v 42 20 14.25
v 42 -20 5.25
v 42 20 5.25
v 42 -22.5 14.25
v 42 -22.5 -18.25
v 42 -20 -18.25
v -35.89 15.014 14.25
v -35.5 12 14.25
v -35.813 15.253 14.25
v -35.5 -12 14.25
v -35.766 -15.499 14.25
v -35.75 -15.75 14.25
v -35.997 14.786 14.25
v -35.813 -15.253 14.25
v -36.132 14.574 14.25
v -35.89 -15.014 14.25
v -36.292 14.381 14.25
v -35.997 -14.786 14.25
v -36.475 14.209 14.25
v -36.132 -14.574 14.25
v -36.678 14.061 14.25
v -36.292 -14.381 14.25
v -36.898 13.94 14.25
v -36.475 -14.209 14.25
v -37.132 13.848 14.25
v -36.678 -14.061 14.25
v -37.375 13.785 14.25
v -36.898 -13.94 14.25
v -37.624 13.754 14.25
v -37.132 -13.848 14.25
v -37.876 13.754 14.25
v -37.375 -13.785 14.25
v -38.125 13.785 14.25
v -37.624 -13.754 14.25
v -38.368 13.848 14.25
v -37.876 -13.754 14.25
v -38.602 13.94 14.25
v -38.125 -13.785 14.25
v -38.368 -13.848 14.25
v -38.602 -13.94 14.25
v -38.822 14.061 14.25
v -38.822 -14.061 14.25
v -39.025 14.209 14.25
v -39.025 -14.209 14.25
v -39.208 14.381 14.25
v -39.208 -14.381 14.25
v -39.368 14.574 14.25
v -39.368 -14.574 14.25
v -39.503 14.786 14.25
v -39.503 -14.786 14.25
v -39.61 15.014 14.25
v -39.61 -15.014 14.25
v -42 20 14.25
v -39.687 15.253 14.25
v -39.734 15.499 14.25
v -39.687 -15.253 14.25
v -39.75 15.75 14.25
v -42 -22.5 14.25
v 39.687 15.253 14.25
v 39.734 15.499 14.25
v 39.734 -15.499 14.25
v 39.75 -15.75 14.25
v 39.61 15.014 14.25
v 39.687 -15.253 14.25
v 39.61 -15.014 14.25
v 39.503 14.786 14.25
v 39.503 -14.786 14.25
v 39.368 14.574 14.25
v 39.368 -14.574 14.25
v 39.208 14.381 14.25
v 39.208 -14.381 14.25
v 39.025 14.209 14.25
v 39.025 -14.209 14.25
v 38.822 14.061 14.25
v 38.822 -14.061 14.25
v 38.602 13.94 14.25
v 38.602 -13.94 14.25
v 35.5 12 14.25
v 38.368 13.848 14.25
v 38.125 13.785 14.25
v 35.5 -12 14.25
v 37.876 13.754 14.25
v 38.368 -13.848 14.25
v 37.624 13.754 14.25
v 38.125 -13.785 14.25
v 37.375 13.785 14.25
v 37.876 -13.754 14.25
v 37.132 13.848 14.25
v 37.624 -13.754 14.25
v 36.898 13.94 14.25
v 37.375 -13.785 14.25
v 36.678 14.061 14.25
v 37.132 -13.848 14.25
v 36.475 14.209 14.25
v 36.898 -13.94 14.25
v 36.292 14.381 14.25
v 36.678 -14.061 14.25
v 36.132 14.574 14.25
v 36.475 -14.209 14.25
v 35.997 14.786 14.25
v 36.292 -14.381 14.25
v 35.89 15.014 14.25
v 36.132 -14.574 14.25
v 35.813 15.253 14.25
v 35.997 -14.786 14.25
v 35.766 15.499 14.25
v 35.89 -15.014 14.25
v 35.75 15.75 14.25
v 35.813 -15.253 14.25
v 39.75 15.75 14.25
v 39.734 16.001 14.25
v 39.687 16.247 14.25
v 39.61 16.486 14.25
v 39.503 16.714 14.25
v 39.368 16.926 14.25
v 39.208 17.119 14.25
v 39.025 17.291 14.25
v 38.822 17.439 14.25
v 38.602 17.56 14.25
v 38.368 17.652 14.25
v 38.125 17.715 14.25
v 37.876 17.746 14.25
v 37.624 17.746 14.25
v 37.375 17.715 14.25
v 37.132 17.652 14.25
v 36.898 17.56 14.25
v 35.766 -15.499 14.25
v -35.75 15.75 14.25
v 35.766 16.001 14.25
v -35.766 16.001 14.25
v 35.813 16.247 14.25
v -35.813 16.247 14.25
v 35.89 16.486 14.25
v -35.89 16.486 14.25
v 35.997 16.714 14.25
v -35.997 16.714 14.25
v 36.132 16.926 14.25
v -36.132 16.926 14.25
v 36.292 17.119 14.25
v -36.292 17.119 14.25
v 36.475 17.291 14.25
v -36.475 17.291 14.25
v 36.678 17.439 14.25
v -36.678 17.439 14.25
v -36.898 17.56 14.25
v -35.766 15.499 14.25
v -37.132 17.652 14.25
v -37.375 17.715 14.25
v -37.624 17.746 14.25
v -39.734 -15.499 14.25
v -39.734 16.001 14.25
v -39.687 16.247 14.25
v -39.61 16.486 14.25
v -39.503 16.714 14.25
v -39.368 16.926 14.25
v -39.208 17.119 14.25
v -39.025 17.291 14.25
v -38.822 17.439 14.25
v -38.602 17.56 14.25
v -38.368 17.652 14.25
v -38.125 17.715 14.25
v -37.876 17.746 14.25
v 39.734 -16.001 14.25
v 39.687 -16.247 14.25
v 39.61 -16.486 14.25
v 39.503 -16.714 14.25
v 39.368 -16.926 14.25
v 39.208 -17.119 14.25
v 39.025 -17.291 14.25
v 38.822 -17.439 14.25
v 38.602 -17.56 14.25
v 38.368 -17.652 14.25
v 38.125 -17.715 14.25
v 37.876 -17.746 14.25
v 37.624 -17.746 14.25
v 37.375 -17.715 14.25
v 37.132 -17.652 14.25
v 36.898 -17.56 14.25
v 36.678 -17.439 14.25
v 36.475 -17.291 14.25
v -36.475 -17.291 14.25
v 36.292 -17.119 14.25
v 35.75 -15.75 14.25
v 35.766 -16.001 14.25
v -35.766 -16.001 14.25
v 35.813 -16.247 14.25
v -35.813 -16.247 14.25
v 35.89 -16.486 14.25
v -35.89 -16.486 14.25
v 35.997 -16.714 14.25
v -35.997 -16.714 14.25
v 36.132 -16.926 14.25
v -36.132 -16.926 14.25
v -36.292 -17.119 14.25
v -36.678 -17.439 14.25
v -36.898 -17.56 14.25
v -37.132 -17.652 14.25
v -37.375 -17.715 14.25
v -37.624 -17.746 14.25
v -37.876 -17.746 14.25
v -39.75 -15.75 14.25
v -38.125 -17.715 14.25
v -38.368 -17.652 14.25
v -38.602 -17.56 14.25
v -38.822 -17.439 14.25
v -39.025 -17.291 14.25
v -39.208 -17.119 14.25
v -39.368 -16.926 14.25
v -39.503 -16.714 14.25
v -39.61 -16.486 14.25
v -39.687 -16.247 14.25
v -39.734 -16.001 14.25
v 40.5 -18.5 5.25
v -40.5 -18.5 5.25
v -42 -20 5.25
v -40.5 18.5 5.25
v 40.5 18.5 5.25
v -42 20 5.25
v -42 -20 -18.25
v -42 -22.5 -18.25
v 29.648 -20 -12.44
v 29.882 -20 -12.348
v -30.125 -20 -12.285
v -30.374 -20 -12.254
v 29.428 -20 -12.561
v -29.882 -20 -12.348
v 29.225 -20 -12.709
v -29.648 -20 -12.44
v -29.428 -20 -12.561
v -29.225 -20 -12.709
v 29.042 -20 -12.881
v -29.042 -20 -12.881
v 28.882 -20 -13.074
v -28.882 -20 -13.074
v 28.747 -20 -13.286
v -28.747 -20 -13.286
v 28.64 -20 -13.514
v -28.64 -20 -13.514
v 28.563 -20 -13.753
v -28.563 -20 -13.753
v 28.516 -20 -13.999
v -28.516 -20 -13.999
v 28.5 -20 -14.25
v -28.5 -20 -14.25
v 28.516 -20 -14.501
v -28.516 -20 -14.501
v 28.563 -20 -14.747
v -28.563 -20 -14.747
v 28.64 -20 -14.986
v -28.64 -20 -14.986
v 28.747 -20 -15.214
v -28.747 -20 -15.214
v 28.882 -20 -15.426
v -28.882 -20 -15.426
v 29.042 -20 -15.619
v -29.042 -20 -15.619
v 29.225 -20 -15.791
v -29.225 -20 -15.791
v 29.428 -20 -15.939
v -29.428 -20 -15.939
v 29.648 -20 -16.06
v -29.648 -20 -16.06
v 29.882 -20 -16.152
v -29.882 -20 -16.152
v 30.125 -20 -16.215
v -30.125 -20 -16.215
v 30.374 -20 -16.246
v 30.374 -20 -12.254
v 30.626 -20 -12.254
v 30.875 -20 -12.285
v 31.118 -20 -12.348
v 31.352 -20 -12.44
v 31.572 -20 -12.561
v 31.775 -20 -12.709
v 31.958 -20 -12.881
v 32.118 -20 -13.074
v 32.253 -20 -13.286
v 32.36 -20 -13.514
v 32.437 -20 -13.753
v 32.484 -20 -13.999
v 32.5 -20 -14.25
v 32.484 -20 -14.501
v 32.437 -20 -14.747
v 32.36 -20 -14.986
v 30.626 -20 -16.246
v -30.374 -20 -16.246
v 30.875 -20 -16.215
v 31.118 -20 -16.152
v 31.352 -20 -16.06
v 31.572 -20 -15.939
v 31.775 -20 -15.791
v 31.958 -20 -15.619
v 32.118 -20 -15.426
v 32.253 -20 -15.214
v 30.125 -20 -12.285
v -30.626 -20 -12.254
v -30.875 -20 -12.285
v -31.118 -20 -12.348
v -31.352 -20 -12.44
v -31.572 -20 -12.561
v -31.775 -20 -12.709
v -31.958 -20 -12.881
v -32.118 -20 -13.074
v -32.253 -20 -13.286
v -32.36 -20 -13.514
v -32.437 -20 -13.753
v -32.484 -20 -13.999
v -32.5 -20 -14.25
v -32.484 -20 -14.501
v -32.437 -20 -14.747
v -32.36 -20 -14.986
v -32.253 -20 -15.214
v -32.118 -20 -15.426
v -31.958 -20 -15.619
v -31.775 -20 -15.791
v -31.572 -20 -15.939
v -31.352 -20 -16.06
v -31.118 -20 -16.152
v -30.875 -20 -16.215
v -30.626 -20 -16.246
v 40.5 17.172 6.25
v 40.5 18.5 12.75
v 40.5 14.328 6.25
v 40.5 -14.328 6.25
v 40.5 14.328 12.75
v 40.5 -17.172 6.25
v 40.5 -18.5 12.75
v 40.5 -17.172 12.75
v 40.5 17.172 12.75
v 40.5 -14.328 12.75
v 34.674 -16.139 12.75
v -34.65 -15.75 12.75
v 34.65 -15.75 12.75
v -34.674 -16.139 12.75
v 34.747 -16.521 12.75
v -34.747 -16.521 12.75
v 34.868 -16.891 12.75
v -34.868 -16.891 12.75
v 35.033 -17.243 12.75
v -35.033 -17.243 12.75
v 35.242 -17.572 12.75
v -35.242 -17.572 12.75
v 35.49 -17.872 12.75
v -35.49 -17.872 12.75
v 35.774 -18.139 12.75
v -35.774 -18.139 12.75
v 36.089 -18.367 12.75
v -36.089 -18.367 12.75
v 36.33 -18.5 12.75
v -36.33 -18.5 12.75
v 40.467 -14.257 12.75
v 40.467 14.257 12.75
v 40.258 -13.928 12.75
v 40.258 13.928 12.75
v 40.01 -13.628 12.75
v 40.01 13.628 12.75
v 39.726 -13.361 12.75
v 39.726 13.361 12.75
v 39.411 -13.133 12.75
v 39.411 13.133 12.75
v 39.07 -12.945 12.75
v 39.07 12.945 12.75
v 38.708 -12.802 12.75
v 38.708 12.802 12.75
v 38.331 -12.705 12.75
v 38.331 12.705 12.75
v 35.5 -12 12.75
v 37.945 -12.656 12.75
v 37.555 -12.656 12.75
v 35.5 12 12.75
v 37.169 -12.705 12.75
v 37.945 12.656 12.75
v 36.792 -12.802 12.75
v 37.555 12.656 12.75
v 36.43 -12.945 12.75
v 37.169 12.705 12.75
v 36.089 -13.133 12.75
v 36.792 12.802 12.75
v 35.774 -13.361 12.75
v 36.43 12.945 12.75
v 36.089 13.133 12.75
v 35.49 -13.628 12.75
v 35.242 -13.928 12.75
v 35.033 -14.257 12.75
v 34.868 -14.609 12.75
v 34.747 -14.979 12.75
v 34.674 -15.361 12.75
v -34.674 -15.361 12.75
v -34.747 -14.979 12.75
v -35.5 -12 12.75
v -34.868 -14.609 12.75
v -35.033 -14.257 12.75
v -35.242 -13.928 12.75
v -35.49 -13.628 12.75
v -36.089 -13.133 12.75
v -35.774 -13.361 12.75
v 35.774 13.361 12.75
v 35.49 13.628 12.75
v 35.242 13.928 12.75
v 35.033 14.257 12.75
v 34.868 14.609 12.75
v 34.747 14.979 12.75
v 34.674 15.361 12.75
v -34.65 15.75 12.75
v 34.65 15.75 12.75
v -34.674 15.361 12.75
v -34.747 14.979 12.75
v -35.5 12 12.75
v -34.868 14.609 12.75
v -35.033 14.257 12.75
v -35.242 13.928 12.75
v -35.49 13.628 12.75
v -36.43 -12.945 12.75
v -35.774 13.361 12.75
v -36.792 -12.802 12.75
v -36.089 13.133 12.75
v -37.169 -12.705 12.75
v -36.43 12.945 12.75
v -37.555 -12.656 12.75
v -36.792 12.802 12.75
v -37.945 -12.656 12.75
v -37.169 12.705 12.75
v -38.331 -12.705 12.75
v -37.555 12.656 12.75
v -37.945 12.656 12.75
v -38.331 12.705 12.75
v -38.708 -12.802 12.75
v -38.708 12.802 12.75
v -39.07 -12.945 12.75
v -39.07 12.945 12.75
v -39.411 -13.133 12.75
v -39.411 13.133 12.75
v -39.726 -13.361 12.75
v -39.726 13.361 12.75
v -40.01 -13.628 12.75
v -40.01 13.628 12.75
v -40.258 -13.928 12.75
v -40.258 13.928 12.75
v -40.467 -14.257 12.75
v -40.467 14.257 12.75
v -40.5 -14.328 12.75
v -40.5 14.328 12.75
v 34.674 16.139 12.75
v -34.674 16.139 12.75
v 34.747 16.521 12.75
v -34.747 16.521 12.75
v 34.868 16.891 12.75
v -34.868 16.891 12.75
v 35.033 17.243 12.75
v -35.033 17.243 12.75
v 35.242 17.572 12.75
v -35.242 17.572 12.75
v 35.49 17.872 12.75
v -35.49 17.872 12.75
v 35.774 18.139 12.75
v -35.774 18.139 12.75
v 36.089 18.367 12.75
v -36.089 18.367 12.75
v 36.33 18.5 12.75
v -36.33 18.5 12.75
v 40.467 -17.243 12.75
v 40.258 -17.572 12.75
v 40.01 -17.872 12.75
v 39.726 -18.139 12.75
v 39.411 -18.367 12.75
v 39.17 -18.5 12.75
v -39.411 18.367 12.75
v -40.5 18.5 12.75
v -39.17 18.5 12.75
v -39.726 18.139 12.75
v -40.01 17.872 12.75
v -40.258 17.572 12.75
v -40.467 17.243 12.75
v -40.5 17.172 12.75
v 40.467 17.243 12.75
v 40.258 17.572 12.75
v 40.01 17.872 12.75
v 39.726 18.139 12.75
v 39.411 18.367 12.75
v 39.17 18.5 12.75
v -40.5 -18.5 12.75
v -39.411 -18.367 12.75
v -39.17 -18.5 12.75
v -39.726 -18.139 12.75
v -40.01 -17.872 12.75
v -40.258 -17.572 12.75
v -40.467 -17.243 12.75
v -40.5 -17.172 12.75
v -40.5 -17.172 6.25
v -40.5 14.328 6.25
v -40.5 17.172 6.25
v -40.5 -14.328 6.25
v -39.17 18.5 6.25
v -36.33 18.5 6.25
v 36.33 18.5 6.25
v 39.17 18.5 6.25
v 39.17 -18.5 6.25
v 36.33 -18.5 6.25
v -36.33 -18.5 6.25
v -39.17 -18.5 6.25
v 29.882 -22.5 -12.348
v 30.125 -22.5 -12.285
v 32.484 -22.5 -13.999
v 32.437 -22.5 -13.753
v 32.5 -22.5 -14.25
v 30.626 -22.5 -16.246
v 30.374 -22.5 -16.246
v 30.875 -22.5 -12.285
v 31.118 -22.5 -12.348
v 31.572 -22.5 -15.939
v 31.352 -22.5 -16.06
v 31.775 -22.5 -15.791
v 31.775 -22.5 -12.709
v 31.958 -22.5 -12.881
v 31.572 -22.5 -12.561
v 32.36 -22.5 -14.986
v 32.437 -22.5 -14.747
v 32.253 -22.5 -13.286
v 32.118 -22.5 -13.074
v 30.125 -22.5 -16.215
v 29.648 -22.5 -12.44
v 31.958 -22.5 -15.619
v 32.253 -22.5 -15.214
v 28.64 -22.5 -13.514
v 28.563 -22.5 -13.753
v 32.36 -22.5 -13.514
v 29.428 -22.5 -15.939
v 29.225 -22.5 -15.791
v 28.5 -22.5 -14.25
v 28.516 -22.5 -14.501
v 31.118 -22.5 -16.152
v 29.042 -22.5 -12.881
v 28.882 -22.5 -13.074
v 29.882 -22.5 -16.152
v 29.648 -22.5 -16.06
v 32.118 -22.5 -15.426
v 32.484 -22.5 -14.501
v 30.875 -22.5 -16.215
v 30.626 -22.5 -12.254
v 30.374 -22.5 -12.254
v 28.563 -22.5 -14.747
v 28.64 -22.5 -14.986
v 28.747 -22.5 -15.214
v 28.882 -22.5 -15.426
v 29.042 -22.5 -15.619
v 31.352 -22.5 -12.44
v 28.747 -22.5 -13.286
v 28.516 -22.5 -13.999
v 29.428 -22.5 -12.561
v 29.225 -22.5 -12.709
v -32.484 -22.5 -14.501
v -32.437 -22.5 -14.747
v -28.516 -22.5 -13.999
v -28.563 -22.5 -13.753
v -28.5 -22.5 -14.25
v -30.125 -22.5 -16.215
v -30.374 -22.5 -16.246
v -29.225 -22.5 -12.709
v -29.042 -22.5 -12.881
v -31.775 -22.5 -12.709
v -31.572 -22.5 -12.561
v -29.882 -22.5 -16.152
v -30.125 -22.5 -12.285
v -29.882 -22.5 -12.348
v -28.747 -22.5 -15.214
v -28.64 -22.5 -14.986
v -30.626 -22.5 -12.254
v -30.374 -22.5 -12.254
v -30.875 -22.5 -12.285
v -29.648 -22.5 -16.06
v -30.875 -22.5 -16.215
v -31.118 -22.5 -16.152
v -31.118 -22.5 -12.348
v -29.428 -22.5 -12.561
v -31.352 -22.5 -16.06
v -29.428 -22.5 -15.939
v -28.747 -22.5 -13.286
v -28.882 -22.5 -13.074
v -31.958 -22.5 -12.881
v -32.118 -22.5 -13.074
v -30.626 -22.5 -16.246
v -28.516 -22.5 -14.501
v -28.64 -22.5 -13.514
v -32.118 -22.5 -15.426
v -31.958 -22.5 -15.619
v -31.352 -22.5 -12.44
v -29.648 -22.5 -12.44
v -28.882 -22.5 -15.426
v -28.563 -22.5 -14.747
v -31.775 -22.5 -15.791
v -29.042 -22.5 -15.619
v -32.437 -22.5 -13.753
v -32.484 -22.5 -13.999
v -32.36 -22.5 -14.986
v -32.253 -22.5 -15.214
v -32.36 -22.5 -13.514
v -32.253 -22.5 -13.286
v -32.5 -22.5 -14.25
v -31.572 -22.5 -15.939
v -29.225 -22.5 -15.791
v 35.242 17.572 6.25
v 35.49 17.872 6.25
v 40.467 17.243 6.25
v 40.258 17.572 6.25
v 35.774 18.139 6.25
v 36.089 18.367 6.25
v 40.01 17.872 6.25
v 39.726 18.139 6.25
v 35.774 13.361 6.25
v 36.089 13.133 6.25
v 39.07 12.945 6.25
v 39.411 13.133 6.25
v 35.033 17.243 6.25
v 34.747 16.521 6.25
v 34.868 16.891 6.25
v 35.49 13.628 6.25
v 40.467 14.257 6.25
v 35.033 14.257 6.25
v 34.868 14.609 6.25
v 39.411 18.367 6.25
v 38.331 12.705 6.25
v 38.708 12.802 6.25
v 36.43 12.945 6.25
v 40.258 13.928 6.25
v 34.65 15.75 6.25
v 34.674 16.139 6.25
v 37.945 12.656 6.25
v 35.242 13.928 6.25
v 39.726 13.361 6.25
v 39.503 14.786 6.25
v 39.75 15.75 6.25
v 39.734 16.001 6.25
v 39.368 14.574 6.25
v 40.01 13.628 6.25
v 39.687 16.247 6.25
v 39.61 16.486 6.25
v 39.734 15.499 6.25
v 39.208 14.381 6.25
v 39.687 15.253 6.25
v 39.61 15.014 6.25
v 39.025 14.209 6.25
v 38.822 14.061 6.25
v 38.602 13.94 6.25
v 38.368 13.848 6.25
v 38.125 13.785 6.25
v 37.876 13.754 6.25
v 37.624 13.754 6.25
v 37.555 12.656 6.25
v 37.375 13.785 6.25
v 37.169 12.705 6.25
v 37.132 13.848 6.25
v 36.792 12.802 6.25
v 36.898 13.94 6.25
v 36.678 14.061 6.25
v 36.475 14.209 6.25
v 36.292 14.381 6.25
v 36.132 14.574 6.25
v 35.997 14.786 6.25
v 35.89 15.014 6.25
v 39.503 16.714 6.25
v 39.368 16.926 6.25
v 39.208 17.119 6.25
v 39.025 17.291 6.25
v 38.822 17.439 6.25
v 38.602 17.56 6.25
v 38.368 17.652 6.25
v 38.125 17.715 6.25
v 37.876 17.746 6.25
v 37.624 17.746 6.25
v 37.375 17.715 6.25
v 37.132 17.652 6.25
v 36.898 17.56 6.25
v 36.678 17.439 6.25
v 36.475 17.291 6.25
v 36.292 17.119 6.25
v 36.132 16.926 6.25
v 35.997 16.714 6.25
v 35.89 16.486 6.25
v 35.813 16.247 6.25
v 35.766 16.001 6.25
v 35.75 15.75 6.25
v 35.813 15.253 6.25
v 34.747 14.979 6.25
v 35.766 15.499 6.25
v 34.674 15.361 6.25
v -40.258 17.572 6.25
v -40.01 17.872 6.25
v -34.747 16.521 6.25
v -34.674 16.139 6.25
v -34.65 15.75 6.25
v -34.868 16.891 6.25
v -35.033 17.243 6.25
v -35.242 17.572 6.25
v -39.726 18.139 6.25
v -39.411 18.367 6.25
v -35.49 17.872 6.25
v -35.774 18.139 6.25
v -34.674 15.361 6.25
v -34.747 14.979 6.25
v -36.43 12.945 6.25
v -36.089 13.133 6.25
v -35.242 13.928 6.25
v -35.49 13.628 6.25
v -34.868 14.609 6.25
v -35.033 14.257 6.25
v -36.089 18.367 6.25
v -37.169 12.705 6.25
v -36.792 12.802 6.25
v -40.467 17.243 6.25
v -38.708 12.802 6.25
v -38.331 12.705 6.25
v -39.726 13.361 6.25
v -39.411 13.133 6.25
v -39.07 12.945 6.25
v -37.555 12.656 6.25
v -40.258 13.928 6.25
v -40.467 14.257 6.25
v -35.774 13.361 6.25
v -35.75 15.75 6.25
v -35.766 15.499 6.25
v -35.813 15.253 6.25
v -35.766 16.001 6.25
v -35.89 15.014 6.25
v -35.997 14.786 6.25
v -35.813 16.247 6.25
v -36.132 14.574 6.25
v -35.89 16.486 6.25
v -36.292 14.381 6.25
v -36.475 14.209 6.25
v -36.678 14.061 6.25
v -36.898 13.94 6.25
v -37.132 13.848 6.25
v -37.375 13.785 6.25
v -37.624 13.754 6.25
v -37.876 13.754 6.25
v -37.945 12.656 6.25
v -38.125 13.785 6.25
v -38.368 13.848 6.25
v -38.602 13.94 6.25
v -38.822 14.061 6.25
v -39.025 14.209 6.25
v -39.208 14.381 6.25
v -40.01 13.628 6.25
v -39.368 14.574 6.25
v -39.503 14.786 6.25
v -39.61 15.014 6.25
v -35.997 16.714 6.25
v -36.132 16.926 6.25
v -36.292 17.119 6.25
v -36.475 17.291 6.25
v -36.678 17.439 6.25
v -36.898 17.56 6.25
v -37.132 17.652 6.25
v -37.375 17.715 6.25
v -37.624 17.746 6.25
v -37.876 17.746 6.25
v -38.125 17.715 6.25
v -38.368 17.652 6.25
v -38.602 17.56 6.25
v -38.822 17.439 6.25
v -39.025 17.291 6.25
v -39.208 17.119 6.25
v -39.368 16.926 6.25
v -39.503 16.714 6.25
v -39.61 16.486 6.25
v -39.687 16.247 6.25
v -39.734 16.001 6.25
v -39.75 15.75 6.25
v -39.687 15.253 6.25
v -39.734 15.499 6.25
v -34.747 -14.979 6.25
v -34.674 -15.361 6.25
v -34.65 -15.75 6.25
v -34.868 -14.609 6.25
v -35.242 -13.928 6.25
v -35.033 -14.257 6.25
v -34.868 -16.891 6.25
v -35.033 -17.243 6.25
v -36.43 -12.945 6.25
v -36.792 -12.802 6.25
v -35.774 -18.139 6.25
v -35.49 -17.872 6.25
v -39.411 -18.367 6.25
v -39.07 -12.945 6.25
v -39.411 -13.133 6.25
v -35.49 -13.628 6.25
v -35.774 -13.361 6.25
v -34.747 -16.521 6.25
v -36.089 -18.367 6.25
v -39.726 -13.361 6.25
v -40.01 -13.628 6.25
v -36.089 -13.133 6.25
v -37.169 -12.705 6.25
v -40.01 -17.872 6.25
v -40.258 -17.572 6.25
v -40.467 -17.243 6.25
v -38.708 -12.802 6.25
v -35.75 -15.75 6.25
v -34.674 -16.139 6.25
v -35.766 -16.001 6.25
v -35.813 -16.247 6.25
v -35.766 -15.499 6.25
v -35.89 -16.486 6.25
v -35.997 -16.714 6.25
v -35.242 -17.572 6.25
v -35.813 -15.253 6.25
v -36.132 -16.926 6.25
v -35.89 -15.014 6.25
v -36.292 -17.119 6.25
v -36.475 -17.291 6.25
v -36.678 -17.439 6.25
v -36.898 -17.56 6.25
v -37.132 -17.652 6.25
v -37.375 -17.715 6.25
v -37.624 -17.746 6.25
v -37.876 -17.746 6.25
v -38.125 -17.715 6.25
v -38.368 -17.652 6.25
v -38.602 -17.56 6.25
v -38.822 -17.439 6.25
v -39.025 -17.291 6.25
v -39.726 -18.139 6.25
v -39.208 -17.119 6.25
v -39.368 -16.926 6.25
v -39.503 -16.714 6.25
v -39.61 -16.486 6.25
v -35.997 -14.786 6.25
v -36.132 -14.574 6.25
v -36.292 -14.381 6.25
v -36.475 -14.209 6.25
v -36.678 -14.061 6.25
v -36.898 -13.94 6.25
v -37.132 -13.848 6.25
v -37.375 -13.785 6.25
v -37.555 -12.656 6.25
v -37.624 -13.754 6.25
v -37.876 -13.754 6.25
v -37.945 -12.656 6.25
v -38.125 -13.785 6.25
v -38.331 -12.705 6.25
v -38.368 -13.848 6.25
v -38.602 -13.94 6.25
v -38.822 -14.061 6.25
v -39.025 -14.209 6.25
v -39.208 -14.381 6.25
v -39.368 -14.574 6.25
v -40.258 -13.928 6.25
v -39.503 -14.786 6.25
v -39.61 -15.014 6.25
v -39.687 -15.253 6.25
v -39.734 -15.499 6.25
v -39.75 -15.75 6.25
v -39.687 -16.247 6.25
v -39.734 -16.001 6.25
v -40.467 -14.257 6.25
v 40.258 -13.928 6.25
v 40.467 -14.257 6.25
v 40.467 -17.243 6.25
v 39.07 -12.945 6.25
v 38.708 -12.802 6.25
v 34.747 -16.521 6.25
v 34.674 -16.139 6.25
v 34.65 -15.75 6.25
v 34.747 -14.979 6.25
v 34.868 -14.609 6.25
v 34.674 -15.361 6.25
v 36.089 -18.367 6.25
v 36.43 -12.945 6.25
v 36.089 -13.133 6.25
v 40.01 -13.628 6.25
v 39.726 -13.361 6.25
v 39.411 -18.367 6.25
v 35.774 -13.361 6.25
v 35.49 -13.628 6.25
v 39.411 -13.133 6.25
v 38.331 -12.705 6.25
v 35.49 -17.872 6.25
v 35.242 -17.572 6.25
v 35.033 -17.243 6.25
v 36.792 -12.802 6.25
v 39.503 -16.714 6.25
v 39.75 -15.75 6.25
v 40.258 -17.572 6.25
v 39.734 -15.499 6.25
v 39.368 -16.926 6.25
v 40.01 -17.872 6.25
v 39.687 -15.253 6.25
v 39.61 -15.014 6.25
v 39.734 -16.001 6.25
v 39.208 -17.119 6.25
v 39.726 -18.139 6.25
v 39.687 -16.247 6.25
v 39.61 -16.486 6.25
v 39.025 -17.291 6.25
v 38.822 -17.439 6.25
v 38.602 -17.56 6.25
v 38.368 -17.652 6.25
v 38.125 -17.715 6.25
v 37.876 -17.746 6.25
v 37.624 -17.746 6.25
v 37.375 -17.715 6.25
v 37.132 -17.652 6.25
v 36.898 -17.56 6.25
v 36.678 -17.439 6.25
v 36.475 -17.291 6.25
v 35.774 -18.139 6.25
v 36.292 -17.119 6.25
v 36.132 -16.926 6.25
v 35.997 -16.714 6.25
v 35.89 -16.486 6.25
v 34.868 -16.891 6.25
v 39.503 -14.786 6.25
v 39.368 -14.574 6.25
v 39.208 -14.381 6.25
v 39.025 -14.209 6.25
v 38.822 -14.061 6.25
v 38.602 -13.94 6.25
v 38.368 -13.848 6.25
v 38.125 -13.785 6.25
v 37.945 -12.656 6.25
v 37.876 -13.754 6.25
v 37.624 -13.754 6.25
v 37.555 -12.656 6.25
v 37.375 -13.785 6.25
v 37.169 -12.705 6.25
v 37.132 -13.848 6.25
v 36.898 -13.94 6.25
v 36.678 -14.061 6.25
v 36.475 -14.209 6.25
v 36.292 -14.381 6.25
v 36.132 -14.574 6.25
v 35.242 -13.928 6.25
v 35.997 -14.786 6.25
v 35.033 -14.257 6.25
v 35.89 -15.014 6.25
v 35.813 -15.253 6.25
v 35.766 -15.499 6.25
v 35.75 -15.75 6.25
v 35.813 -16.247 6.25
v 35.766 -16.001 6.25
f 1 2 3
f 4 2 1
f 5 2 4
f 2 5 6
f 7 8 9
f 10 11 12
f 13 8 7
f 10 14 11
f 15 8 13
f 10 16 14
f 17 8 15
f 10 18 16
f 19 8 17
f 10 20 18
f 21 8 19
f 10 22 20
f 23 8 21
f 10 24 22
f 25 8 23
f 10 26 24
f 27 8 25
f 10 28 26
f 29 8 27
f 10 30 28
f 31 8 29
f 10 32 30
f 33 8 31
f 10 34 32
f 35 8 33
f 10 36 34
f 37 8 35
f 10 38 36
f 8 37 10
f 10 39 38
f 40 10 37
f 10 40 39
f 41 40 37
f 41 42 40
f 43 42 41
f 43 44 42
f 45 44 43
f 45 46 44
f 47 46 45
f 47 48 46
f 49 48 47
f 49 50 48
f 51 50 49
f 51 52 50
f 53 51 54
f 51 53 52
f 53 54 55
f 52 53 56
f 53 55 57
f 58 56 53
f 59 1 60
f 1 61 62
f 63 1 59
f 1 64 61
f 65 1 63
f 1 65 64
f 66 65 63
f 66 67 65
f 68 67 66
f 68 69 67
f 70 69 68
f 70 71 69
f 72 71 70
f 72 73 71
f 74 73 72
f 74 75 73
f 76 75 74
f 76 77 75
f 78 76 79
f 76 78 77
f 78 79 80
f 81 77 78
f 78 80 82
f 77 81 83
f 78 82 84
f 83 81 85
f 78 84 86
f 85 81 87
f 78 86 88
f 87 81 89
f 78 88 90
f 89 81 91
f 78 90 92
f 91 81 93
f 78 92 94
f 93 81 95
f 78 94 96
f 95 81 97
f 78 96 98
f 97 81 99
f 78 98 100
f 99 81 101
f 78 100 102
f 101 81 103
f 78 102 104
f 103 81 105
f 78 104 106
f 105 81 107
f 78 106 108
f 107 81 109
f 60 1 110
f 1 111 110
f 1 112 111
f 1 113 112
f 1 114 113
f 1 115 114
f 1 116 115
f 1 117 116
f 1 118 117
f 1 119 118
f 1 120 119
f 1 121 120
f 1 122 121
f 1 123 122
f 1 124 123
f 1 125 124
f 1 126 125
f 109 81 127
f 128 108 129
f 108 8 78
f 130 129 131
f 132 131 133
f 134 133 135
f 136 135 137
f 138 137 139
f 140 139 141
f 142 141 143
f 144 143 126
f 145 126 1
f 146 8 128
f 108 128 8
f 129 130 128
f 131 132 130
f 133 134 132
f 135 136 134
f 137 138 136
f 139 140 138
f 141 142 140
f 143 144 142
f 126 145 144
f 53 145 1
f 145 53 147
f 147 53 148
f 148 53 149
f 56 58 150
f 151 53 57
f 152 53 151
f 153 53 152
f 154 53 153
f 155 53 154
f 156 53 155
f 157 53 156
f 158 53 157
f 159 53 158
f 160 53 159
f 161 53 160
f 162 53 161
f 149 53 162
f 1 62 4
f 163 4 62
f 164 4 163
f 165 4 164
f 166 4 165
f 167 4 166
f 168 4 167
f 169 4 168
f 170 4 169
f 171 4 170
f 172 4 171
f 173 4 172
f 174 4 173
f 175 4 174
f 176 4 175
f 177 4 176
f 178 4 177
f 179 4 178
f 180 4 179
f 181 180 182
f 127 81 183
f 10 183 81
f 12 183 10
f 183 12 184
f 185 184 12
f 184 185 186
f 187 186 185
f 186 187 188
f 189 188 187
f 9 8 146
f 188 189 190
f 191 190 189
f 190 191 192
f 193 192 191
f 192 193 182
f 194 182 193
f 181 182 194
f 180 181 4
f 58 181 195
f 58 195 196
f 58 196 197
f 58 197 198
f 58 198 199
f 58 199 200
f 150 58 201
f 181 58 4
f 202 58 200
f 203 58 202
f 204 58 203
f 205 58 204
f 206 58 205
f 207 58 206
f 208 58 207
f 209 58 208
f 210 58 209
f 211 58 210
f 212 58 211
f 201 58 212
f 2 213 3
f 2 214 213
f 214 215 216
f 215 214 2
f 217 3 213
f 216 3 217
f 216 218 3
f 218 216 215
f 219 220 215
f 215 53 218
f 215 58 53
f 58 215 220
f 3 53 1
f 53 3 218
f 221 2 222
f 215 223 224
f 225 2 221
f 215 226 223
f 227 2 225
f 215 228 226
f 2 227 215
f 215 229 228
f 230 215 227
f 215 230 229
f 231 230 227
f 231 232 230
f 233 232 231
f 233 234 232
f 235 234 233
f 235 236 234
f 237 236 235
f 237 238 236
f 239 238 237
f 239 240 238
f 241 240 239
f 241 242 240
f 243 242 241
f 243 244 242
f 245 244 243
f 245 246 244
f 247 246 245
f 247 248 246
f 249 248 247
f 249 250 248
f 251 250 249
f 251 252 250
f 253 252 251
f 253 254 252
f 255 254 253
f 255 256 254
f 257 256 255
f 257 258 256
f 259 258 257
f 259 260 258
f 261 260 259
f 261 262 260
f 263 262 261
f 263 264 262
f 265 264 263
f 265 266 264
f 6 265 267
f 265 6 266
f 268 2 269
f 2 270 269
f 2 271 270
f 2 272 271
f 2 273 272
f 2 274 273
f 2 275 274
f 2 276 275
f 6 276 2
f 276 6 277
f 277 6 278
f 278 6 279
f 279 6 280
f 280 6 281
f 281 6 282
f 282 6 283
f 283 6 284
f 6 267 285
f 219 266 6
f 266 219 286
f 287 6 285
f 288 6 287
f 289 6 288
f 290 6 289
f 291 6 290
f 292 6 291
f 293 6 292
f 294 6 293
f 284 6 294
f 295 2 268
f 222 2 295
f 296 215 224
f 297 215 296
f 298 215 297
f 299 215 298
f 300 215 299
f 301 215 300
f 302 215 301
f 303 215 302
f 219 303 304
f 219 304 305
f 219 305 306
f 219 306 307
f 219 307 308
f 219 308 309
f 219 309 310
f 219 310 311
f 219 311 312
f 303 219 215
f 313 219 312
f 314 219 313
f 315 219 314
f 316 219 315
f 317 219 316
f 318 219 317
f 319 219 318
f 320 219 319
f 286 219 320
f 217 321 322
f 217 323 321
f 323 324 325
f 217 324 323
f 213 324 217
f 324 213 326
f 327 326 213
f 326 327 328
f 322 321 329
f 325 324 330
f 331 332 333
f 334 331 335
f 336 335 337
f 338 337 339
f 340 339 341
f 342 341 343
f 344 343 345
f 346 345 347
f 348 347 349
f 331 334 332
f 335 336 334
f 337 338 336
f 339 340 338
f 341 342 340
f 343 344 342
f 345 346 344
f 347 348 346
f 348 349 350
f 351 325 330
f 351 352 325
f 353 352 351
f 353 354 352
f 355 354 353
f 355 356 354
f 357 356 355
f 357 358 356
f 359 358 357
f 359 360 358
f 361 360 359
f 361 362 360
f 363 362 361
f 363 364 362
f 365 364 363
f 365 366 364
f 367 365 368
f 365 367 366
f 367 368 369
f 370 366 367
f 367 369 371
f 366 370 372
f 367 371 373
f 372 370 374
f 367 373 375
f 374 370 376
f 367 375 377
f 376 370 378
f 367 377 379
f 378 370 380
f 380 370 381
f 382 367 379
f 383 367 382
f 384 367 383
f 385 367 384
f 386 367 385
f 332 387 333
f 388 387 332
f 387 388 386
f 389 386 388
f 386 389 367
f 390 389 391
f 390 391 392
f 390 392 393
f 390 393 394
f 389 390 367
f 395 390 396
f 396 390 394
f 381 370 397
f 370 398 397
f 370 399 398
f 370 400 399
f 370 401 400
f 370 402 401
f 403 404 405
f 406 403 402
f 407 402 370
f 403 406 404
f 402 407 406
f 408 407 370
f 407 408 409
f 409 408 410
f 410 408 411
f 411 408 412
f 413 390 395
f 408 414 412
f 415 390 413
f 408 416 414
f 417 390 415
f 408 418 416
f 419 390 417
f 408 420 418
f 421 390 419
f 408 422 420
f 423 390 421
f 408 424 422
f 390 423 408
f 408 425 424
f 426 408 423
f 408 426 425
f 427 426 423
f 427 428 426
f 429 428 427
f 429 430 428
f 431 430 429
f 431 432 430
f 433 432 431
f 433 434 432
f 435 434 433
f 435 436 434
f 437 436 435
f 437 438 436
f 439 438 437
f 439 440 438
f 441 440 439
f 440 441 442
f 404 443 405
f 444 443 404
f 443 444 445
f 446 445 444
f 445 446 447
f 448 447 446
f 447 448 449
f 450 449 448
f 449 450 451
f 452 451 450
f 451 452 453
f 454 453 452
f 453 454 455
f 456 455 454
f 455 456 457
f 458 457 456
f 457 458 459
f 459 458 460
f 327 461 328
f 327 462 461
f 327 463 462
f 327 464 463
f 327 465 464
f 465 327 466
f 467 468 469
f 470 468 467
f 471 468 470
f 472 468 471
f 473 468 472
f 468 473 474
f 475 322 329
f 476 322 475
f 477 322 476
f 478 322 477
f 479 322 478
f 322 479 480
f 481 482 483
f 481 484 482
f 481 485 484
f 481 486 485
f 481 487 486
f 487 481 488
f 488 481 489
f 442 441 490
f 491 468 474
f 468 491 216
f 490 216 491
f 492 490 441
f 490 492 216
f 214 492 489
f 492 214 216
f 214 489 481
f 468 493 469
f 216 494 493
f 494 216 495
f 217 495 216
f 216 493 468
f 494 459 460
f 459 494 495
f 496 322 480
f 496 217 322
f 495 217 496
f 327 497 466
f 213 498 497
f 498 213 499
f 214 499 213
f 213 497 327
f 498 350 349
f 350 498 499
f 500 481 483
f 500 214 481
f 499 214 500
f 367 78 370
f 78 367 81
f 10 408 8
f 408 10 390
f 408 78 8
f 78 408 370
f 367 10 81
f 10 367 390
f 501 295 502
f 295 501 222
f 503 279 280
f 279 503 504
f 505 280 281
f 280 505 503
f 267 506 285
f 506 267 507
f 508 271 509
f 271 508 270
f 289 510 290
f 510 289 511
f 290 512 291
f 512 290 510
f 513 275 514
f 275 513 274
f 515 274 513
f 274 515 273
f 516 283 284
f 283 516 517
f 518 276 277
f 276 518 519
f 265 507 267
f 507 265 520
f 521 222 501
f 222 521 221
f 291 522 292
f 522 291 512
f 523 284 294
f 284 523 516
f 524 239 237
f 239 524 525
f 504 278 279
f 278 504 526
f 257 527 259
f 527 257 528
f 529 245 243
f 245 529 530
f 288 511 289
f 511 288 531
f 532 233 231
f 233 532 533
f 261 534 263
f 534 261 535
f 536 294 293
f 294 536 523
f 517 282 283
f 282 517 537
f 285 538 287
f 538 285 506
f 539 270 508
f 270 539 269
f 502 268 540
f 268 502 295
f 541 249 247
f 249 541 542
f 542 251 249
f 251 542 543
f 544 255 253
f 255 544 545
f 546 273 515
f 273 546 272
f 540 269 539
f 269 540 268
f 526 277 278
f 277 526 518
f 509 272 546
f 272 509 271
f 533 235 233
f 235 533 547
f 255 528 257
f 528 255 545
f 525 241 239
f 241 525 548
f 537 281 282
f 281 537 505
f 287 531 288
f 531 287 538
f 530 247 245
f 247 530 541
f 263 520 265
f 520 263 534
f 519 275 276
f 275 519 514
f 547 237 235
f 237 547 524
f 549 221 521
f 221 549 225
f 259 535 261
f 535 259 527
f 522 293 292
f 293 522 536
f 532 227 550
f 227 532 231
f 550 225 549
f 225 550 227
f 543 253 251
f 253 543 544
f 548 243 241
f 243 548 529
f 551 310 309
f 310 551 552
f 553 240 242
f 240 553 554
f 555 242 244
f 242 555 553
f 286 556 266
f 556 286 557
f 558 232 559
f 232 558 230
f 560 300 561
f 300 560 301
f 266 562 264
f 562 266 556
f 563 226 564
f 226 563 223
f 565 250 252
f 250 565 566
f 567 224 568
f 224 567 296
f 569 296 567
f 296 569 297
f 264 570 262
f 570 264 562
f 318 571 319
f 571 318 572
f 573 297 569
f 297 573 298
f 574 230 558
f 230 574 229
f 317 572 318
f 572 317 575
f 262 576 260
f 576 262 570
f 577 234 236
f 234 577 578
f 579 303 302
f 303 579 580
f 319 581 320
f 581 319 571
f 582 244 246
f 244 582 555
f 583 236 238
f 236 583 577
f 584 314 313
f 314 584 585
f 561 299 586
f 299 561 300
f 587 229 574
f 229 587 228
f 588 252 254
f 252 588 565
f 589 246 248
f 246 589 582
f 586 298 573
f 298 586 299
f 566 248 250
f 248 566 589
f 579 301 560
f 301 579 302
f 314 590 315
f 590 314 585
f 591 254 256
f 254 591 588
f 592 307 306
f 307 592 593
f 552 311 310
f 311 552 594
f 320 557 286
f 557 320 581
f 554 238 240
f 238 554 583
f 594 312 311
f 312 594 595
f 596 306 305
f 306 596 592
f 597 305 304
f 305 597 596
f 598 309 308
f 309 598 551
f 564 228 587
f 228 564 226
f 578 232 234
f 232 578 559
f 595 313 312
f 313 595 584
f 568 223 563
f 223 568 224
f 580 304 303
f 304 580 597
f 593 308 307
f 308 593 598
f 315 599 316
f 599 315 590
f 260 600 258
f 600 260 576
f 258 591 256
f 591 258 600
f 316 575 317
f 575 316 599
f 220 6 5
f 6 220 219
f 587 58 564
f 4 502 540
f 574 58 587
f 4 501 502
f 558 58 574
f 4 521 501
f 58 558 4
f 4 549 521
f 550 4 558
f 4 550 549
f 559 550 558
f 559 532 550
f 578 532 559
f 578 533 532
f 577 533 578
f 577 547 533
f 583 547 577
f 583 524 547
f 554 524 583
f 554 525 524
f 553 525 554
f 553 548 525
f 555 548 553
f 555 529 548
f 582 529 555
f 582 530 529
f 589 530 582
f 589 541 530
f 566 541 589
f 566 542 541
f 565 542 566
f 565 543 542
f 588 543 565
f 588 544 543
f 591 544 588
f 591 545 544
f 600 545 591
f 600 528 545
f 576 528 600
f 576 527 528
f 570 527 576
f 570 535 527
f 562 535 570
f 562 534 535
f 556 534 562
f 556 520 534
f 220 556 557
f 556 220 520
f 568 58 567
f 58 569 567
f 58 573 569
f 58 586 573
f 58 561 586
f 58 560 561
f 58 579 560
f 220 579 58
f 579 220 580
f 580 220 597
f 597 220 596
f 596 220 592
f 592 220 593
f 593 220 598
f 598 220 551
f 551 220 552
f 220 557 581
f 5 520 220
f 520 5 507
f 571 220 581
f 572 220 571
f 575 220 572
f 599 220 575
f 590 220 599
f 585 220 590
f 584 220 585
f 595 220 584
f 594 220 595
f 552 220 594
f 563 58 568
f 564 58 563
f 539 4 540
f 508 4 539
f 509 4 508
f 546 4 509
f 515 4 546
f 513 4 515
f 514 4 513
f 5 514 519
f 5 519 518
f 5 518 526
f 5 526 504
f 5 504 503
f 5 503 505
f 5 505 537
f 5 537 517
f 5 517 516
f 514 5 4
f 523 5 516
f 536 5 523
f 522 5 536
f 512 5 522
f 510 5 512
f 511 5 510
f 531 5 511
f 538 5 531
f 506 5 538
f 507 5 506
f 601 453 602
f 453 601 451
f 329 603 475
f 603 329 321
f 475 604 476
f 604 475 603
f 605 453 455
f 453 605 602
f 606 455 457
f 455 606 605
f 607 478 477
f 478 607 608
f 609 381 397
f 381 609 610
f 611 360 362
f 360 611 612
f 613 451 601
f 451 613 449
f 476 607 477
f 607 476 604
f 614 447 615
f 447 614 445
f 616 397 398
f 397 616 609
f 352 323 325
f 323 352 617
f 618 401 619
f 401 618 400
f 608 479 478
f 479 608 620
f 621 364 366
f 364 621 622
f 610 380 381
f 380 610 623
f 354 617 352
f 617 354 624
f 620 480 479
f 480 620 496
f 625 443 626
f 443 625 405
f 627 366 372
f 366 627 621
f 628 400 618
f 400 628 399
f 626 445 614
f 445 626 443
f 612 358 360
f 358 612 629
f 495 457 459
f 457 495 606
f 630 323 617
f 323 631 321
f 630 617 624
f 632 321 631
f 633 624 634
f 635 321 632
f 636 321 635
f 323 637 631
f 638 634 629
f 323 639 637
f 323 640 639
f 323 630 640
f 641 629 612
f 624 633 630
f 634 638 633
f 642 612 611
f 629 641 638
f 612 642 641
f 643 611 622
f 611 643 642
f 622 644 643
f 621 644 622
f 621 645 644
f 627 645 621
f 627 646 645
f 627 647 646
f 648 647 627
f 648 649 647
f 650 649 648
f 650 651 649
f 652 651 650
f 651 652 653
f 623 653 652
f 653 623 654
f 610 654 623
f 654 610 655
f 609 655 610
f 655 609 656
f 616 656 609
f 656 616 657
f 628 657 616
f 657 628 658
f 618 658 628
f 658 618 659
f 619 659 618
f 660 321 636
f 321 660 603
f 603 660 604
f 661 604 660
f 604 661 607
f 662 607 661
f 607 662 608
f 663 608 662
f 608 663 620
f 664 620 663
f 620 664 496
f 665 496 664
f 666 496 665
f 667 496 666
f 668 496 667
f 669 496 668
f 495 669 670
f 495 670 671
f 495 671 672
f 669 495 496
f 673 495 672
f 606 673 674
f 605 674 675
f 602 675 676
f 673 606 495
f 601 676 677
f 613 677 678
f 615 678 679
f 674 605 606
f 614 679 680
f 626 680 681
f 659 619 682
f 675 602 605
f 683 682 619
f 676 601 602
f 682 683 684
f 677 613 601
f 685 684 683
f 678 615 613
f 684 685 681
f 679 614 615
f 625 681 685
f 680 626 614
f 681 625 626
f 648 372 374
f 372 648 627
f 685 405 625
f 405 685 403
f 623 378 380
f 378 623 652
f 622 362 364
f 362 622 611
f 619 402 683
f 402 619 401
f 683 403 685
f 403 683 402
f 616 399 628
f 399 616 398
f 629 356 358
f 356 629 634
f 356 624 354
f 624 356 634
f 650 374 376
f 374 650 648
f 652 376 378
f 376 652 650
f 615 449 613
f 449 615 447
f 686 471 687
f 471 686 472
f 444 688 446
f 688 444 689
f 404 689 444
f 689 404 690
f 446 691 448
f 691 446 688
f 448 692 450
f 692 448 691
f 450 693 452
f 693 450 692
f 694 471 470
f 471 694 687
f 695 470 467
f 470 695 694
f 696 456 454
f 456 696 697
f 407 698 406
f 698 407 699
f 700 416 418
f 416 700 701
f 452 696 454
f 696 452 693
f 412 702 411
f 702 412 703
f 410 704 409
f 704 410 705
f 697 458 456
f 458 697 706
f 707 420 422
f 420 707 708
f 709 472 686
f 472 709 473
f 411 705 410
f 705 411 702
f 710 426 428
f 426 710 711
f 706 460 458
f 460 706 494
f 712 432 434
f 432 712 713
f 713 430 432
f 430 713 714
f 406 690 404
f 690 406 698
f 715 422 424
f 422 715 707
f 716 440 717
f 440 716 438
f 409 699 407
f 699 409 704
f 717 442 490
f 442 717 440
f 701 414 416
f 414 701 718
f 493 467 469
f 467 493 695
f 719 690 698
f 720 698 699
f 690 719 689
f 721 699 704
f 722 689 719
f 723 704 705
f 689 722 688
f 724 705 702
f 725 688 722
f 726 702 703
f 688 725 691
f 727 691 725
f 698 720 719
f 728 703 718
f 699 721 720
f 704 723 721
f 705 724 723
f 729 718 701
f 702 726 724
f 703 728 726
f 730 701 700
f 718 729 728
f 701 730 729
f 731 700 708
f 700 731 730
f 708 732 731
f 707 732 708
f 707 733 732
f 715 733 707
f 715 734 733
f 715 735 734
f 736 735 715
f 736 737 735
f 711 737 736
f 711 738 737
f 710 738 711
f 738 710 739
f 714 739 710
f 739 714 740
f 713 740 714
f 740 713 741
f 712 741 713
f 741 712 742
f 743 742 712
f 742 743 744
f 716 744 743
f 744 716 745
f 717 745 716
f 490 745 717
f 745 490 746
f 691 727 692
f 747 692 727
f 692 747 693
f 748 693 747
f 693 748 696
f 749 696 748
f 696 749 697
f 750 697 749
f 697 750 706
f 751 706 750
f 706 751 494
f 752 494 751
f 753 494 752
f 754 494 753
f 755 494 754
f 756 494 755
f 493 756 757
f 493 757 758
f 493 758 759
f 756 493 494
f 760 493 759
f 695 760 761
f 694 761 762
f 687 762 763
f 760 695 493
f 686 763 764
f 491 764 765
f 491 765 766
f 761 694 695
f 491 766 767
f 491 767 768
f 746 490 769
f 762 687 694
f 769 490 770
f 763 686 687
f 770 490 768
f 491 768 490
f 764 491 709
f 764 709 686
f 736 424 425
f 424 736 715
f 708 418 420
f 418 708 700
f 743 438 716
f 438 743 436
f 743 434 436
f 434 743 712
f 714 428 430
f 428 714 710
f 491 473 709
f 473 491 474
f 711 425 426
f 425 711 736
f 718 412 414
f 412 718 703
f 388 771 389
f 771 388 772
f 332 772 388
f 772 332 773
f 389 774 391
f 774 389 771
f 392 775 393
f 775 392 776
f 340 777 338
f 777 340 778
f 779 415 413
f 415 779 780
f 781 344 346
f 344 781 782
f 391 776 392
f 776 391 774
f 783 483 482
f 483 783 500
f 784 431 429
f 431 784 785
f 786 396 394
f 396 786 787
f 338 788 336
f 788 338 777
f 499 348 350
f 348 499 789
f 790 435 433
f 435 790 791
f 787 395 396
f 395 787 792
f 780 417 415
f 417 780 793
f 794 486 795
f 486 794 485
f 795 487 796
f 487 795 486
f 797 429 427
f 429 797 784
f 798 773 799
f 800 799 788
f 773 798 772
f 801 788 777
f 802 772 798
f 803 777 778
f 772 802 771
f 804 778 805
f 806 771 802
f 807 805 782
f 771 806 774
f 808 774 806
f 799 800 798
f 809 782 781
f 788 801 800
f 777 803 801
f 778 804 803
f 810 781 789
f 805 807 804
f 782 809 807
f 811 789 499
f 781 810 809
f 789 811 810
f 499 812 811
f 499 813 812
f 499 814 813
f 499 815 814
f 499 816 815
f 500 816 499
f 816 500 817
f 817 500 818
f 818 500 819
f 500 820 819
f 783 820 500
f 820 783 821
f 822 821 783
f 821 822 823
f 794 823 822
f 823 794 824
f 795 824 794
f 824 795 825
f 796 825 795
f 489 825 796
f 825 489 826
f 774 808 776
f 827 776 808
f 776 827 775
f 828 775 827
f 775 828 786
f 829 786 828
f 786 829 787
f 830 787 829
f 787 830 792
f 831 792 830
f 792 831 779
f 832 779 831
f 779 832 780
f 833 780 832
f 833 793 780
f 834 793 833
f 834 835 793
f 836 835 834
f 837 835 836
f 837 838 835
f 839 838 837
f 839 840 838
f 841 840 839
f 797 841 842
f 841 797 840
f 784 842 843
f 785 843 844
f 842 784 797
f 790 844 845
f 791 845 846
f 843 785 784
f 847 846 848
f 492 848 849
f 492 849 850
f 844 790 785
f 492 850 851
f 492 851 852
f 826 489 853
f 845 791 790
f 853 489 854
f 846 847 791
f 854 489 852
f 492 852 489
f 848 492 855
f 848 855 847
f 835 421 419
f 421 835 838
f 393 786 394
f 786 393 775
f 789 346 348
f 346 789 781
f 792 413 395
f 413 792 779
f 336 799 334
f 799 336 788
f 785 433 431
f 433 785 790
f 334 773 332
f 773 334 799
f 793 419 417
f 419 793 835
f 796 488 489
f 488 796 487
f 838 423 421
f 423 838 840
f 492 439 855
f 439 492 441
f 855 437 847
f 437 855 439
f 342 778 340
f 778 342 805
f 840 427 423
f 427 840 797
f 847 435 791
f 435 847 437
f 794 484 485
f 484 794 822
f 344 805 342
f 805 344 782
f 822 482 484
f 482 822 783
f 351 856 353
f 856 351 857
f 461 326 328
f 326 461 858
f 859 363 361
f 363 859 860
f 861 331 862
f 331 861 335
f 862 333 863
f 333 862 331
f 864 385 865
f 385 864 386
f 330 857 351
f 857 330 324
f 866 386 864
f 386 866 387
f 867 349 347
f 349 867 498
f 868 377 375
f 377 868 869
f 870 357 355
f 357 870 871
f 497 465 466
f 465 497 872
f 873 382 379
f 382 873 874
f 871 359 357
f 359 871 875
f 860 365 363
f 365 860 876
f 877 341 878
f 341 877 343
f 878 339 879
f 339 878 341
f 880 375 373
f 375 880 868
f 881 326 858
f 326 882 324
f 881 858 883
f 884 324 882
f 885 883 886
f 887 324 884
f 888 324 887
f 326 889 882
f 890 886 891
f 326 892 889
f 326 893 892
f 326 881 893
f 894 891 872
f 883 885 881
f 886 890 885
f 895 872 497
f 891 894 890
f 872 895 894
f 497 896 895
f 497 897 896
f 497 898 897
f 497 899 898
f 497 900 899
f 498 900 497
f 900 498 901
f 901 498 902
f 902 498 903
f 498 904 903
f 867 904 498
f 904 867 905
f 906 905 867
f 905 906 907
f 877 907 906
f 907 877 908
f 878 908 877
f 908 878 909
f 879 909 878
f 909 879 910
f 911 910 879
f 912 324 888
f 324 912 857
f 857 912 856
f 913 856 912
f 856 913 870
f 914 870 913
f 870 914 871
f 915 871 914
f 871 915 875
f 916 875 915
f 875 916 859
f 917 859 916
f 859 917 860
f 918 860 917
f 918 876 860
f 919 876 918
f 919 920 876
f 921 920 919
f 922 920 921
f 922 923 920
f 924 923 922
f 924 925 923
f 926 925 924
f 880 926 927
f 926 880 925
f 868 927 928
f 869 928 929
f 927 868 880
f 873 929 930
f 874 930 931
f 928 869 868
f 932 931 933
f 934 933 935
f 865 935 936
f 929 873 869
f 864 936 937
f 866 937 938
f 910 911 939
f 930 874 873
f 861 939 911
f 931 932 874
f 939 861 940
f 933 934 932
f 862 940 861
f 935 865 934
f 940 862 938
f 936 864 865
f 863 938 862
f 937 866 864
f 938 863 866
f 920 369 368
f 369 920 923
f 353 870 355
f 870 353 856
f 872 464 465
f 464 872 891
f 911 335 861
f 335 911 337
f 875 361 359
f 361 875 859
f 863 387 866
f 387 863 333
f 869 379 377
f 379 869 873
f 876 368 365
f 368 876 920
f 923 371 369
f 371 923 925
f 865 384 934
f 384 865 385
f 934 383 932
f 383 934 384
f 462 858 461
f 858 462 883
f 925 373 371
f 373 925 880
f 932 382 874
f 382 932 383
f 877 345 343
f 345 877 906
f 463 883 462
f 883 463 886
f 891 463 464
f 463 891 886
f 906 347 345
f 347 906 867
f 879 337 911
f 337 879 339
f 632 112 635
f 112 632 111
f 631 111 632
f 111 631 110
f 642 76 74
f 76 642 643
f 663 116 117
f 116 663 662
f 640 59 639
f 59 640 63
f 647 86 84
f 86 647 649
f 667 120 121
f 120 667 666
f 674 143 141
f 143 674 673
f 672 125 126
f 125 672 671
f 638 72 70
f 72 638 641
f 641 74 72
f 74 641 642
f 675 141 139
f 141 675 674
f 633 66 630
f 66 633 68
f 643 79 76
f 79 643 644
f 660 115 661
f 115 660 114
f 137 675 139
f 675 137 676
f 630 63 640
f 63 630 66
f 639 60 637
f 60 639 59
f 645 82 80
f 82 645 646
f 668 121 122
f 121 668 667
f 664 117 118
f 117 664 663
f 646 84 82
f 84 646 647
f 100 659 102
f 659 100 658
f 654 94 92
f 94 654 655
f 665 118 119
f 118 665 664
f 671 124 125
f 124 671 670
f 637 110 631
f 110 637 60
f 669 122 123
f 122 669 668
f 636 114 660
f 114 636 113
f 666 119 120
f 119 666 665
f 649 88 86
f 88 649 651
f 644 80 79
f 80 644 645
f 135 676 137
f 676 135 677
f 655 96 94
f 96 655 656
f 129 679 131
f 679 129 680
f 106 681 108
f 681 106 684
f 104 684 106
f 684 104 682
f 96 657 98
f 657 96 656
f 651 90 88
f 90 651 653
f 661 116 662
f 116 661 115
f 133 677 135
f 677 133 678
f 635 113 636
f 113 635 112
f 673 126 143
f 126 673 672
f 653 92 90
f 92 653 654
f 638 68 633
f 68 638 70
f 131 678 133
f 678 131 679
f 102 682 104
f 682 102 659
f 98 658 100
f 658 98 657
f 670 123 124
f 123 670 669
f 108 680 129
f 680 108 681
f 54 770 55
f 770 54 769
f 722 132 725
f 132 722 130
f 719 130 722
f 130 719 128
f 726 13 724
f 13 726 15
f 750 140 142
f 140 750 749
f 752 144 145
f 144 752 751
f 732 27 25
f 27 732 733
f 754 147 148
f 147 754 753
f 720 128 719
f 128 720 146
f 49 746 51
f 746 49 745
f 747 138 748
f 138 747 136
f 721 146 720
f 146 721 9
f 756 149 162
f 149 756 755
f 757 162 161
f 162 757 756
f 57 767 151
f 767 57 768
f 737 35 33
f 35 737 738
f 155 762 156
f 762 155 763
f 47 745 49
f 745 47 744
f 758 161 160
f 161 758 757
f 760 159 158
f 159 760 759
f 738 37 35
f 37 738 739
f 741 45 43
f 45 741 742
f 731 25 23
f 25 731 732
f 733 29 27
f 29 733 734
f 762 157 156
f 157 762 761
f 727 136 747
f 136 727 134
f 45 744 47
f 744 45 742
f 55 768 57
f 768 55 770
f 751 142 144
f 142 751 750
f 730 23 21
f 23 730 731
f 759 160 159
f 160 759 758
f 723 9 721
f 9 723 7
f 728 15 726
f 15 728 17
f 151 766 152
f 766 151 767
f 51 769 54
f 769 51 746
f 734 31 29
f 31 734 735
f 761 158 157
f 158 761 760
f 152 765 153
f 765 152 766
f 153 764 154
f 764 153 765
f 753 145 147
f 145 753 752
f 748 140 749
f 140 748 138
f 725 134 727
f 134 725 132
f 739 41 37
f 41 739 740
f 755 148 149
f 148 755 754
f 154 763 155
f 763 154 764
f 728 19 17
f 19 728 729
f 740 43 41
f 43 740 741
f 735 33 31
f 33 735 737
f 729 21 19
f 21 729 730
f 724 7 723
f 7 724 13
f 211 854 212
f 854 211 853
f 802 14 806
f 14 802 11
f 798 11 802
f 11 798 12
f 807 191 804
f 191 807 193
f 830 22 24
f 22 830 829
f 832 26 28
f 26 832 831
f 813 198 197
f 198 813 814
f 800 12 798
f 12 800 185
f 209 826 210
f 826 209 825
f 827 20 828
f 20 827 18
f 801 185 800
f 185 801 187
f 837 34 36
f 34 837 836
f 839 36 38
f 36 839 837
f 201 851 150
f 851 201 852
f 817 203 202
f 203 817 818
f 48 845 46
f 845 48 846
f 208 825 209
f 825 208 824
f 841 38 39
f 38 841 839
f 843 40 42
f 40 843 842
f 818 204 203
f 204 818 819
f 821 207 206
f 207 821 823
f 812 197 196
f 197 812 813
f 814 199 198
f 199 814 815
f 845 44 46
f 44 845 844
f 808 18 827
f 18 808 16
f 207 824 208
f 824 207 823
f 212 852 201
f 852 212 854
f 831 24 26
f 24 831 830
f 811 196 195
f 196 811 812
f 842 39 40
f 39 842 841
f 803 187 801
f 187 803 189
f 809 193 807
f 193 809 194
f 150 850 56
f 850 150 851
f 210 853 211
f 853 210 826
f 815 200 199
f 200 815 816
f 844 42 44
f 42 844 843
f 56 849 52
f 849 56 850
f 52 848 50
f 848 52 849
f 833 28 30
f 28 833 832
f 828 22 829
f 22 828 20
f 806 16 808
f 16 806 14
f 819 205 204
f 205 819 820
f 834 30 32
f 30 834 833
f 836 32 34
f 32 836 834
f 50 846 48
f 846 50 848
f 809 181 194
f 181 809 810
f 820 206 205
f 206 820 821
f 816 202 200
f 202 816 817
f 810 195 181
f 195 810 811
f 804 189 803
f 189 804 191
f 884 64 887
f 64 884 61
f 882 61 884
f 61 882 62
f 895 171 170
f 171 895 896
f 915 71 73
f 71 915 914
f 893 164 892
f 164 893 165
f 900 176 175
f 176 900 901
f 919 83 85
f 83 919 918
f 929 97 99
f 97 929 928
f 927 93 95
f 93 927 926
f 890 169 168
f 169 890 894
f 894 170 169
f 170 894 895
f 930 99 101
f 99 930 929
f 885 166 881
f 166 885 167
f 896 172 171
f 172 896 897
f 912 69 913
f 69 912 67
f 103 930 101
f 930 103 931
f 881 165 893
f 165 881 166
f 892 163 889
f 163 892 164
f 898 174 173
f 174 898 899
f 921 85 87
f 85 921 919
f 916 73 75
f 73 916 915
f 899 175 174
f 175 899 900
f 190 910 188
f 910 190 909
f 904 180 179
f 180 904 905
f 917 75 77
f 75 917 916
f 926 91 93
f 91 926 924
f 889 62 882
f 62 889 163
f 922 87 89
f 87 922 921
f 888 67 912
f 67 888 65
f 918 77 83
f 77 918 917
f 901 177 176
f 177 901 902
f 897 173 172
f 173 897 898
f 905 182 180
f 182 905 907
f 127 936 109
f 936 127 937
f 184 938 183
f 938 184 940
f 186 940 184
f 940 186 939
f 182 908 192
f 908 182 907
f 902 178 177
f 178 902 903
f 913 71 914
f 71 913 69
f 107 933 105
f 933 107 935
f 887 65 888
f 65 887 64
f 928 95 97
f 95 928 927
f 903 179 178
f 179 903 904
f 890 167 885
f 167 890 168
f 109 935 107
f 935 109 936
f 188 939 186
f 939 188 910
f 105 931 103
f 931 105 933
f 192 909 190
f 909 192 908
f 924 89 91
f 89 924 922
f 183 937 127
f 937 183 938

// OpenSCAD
$fn = 50;

pcb_l = 80;
pcb_w = 36;
pcb_h = 2;

interhole_l = 75.5;
interhole_w = 31.5;

wall = 1.5;

inbox_l = pcb_l + 1;
inbox_w = pcb_w + 1;
inbox_h = 10;

box_l = inbox_l + 2*wall;
box_w = inbox_w + 2*wall;
box_h = inbox_h + wall;

hole_d = 3.2;
pass_hole_d = 4;

hole_wall_d = hole_d + wall*2;
pass_hole_wall_d = pass_hole_d + wall*2;

attach_w = 21+box_h;

lid_box_h = 9;
lid_inbox_h = lid_box_h - wall;

lcd_l = 71;
lcd_w = 24;

module lid() {
  color("green") {
//import("/home/n800s/work/printer3d/openscad/good2print/bio/centrifuge/2.stl");
    translate([0, 0, lid_box_h]) {
      difference() {
        union() {
          difference() {
            translate([0, 0, wall/2]) {
              cube([box_l, box_w, lid_box_h], center=true);
            }
            cube([inbox_l, inbox_w, lid_inbox_h], center=true);
            cube([lcd_l, lcd_w, 50], center=true);
          }
          // hole walls
          translate([interhole_l/2, interhole_w/2, pcb_h/4]) {
            cylinder(d=hole_wall_d, h=lid_inbox_h-pcb_h/2, center=true);
          }
          translate([-interhole_l/2, interhole_w/2, pcb_h/4]) {
            cylinder(d=hole_wall_d, h=lid_inbox_h-pcb_h/2, center=true);
          }
          translate([-interhole_l/2, -interhole_w/2, pcb_h/4]) {
            cylinder(d=hole_wall_d, h=lid_inbox_h-pcb_h/2, center=true);
          }
          translate([interhole_l/2, -interhole_w/2, pcb_h/4]) {
            cylinder(d=hole_wall_d, h=lid_inbox_h-pcb_h/2, center=true);
          }
          // attachment
          difference() {
            translate([0, -box_w/2-wall/2-0.5, (-attach_w+lid_box_h+wall)/2]) {
              cube([box_l, wall+1, attach_w], center=true);
            }
            translate([0, -box_w/2, -attach_w/2-2]) {
              translate([inbox_l/2-10, 0, -5]) {
                rotate([90, 0, 0]) {
                  cylinder(d=pass_hole_d, h=20, center=true);
                }
              }
              translate([-inbox_l/2+10, 0, -5]) {
                rotate([90, 0, 0]) {
                  cylinder(d=pass_hole_d, h=20, center=true);
                }
              }
            }
          }
        }
        // holes
        translate([0, 0, -25]) {
          translate([interhole_l/2, interhole_w/2, 25]) {
            cylinder(d=pass_hole_d, h=50, center=true);
          }
          translate([-interhole_l/2, interhole_w/2, 25]) {
            cylinder(d=pass_hole_d, h=50, center=true);
          }
          translate([-interhole_l/2, -interhole_w/2, 25]) {
            cylinder(d=pass_hole_d, h=50, center=true);
          }
          translate([interhole_l/2, -interhole_w/2, 25]) {
            cylinder(d=pass_hole_d, h=50, center=true);
          }
        }
      }
    }
  }
}

module box() {
  color("blue") {
    difference() {
      union() {
        difference() {
          translate([0, 0, -wall/2]) {
            cube([box_l, box_w, box_h], center=true);
          }
          cube([inbox_l, inbox_w, inbox_h], center=true);
        }
        // hole walls
        translate([interhole_l/2, interhole_w/2, -pcb_h/4]) {
          cylinder(d=hole_wall_d, h=inbox_h-pcb_h/2, center=true);
        }
        translate([-interhole_l/2, interhole_w/2, -pcb_h/4]) {
          cylinder(d=hole_wall_d, h=inbox_h-pcb_h/2, center=true);
        }
        translate([-interhole_l/2, -interhole_w/2, -pcb_h/4]) {
          cylinder(d=hole_wall_d, h=inbox_h-pcb_h/2, center=true);
        }
        translate([interhole_l/2, -interhole_w/2, -pcb_h/4]) {
          cylinder(d=hole_wall_d, h=inbox_h-pcb_h/2, center=true);
        }
      }
      // holes
      translate([0, 0, -25]) {
        translate([interhole_l/2, interhole_w/2, 25]) {
          cylinder(d=hole_d, h=50, center=true);
        }
        translate([-interhole_l/2, interhole_w/2, 25]) {
          cylinder(d=hole_d, h=50, center=true);
        }
        translate([-interhole_l/2, -interhole_w/2, 25]) {
          cylinder(d=hole_d, h=50, center=true);
        }
        translate([interhole_l/2, -interhole_w/2, 25]) {
          cylinder(d=hole_d, h=50, center=true);
        }
      }
      // wire hole
      wh_w = 13;
      translate([inbox_l/2, -inbox_w/2+wh_w/2+5, 0]) {
        cube([20, wh_w,  inbox_h], center=true);
      }
    }
  }
}

lid();
//box();
